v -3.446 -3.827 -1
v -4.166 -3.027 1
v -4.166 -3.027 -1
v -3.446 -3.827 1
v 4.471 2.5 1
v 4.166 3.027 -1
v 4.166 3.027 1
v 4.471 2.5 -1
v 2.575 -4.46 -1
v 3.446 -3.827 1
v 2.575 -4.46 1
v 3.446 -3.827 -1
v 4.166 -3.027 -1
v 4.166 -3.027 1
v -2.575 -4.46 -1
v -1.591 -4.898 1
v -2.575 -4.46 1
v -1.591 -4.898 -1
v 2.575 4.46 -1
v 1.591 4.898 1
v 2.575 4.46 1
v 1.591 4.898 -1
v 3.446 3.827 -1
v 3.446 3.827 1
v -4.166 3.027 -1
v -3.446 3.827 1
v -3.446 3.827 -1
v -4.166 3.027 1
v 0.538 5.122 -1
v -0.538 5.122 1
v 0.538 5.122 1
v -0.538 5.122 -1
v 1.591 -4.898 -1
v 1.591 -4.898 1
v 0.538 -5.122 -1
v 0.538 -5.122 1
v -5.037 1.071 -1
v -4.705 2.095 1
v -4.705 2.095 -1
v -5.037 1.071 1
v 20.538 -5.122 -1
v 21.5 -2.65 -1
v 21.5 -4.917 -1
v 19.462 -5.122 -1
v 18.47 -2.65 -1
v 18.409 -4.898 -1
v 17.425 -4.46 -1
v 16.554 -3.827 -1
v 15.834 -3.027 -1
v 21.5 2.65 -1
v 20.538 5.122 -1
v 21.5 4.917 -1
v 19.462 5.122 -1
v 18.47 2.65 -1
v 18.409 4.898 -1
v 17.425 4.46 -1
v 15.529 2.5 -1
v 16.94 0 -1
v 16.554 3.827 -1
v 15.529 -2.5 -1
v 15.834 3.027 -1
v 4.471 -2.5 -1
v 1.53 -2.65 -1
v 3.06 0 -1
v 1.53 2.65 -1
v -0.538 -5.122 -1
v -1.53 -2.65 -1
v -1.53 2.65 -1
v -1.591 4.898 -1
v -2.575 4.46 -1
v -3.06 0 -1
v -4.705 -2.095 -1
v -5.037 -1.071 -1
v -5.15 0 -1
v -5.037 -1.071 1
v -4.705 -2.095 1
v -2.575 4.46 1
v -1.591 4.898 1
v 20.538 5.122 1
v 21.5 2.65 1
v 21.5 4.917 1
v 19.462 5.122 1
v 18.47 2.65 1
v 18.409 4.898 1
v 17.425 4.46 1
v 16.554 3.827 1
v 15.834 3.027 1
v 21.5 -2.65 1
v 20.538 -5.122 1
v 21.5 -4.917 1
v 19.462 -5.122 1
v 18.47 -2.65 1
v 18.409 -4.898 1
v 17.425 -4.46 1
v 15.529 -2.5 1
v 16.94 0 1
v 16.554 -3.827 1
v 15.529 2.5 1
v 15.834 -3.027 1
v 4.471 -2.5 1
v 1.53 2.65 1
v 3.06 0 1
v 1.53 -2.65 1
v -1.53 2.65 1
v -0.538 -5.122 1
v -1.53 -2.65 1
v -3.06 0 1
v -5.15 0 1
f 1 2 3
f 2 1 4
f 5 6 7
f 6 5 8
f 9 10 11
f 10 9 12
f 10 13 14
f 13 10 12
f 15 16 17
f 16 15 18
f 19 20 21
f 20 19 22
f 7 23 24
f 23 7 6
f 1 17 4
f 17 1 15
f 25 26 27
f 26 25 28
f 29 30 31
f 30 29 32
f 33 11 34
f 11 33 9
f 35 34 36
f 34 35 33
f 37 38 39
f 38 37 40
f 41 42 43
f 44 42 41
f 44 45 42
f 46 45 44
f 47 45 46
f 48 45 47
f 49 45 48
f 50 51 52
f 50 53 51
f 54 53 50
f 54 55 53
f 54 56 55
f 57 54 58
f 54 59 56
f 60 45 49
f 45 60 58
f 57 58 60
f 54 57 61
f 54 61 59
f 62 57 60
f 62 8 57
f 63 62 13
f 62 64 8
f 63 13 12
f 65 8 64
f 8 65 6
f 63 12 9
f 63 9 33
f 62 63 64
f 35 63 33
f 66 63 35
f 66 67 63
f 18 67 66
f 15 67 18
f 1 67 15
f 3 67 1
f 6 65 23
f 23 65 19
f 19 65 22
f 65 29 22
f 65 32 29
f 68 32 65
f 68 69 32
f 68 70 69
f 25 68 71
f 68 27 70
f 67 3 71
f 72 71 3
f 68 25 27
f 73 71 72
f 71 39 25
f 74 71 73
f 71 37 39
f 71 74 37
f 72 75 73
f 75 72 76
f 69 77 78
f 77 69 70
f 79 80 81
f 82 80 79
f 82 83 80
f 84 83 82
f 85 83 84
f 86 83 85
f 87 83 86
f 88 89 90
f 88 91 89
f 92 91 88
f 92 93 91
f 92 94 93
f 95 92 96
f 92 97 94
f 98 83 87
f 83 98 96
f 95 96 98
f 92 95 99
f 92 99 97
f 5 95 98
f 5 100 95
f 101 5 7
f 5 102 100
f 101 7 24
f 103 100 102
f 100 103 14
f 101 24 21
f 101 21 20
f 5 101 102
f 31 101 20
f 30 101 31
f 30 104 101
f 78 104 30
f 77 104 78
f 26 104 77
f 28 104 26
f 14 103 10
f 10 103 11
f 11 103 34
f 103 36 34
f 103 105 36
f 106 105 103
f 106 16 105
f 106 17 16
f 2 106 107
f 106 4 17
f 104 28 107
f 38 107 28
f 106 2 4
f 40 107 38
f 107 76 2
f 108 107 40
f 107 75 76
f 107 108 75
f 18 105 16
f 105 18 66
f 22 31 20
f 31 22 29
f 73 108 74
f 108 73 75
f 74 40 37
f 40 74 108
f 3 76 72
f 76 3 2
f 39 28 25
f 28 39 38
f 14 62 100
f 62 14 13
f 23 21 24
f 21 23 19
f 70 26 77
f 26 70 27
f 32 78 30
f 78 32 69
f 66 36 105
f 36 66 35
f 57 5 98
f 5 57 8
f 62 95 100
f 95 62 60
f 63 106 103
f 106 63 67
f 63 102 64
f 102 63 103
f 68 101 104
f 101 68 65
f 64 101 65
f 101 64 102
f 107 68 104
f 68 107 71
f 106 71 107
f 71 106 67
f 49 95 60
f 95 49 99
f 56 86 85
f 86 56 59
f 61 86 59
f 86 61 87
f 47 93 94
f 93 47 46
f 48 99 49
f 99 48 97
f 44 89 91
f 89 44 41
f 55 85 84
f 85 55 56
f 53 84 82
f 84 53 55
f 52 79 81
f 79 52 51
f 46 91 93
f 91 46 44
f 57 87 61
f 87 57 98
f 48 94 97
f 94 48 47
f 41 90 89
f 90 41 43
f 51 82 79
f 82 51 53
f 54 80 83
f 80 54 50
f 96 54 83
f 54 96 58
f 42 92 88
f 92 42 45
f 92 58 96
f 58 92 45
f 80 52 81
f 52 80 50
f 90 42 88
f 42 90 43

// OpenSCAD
h = 2;

w = 5.3;

module end(){
  difference(){
    union(){
      cylinder(d=w+5, h=h, $fn=30,center=true);
      translate([5, 0, 0])cube([10, 5, h], center=true);
    }
    cylinder(r=w / (2 * cos(30)), h=h+2, $fn=6,center=true);
  }
}

end();
translate([20,0,0])
difference(){
  rotate([0,0,180])end();
  translate([11.5,0,0])cube([20, 20, 20],center=true);
}
